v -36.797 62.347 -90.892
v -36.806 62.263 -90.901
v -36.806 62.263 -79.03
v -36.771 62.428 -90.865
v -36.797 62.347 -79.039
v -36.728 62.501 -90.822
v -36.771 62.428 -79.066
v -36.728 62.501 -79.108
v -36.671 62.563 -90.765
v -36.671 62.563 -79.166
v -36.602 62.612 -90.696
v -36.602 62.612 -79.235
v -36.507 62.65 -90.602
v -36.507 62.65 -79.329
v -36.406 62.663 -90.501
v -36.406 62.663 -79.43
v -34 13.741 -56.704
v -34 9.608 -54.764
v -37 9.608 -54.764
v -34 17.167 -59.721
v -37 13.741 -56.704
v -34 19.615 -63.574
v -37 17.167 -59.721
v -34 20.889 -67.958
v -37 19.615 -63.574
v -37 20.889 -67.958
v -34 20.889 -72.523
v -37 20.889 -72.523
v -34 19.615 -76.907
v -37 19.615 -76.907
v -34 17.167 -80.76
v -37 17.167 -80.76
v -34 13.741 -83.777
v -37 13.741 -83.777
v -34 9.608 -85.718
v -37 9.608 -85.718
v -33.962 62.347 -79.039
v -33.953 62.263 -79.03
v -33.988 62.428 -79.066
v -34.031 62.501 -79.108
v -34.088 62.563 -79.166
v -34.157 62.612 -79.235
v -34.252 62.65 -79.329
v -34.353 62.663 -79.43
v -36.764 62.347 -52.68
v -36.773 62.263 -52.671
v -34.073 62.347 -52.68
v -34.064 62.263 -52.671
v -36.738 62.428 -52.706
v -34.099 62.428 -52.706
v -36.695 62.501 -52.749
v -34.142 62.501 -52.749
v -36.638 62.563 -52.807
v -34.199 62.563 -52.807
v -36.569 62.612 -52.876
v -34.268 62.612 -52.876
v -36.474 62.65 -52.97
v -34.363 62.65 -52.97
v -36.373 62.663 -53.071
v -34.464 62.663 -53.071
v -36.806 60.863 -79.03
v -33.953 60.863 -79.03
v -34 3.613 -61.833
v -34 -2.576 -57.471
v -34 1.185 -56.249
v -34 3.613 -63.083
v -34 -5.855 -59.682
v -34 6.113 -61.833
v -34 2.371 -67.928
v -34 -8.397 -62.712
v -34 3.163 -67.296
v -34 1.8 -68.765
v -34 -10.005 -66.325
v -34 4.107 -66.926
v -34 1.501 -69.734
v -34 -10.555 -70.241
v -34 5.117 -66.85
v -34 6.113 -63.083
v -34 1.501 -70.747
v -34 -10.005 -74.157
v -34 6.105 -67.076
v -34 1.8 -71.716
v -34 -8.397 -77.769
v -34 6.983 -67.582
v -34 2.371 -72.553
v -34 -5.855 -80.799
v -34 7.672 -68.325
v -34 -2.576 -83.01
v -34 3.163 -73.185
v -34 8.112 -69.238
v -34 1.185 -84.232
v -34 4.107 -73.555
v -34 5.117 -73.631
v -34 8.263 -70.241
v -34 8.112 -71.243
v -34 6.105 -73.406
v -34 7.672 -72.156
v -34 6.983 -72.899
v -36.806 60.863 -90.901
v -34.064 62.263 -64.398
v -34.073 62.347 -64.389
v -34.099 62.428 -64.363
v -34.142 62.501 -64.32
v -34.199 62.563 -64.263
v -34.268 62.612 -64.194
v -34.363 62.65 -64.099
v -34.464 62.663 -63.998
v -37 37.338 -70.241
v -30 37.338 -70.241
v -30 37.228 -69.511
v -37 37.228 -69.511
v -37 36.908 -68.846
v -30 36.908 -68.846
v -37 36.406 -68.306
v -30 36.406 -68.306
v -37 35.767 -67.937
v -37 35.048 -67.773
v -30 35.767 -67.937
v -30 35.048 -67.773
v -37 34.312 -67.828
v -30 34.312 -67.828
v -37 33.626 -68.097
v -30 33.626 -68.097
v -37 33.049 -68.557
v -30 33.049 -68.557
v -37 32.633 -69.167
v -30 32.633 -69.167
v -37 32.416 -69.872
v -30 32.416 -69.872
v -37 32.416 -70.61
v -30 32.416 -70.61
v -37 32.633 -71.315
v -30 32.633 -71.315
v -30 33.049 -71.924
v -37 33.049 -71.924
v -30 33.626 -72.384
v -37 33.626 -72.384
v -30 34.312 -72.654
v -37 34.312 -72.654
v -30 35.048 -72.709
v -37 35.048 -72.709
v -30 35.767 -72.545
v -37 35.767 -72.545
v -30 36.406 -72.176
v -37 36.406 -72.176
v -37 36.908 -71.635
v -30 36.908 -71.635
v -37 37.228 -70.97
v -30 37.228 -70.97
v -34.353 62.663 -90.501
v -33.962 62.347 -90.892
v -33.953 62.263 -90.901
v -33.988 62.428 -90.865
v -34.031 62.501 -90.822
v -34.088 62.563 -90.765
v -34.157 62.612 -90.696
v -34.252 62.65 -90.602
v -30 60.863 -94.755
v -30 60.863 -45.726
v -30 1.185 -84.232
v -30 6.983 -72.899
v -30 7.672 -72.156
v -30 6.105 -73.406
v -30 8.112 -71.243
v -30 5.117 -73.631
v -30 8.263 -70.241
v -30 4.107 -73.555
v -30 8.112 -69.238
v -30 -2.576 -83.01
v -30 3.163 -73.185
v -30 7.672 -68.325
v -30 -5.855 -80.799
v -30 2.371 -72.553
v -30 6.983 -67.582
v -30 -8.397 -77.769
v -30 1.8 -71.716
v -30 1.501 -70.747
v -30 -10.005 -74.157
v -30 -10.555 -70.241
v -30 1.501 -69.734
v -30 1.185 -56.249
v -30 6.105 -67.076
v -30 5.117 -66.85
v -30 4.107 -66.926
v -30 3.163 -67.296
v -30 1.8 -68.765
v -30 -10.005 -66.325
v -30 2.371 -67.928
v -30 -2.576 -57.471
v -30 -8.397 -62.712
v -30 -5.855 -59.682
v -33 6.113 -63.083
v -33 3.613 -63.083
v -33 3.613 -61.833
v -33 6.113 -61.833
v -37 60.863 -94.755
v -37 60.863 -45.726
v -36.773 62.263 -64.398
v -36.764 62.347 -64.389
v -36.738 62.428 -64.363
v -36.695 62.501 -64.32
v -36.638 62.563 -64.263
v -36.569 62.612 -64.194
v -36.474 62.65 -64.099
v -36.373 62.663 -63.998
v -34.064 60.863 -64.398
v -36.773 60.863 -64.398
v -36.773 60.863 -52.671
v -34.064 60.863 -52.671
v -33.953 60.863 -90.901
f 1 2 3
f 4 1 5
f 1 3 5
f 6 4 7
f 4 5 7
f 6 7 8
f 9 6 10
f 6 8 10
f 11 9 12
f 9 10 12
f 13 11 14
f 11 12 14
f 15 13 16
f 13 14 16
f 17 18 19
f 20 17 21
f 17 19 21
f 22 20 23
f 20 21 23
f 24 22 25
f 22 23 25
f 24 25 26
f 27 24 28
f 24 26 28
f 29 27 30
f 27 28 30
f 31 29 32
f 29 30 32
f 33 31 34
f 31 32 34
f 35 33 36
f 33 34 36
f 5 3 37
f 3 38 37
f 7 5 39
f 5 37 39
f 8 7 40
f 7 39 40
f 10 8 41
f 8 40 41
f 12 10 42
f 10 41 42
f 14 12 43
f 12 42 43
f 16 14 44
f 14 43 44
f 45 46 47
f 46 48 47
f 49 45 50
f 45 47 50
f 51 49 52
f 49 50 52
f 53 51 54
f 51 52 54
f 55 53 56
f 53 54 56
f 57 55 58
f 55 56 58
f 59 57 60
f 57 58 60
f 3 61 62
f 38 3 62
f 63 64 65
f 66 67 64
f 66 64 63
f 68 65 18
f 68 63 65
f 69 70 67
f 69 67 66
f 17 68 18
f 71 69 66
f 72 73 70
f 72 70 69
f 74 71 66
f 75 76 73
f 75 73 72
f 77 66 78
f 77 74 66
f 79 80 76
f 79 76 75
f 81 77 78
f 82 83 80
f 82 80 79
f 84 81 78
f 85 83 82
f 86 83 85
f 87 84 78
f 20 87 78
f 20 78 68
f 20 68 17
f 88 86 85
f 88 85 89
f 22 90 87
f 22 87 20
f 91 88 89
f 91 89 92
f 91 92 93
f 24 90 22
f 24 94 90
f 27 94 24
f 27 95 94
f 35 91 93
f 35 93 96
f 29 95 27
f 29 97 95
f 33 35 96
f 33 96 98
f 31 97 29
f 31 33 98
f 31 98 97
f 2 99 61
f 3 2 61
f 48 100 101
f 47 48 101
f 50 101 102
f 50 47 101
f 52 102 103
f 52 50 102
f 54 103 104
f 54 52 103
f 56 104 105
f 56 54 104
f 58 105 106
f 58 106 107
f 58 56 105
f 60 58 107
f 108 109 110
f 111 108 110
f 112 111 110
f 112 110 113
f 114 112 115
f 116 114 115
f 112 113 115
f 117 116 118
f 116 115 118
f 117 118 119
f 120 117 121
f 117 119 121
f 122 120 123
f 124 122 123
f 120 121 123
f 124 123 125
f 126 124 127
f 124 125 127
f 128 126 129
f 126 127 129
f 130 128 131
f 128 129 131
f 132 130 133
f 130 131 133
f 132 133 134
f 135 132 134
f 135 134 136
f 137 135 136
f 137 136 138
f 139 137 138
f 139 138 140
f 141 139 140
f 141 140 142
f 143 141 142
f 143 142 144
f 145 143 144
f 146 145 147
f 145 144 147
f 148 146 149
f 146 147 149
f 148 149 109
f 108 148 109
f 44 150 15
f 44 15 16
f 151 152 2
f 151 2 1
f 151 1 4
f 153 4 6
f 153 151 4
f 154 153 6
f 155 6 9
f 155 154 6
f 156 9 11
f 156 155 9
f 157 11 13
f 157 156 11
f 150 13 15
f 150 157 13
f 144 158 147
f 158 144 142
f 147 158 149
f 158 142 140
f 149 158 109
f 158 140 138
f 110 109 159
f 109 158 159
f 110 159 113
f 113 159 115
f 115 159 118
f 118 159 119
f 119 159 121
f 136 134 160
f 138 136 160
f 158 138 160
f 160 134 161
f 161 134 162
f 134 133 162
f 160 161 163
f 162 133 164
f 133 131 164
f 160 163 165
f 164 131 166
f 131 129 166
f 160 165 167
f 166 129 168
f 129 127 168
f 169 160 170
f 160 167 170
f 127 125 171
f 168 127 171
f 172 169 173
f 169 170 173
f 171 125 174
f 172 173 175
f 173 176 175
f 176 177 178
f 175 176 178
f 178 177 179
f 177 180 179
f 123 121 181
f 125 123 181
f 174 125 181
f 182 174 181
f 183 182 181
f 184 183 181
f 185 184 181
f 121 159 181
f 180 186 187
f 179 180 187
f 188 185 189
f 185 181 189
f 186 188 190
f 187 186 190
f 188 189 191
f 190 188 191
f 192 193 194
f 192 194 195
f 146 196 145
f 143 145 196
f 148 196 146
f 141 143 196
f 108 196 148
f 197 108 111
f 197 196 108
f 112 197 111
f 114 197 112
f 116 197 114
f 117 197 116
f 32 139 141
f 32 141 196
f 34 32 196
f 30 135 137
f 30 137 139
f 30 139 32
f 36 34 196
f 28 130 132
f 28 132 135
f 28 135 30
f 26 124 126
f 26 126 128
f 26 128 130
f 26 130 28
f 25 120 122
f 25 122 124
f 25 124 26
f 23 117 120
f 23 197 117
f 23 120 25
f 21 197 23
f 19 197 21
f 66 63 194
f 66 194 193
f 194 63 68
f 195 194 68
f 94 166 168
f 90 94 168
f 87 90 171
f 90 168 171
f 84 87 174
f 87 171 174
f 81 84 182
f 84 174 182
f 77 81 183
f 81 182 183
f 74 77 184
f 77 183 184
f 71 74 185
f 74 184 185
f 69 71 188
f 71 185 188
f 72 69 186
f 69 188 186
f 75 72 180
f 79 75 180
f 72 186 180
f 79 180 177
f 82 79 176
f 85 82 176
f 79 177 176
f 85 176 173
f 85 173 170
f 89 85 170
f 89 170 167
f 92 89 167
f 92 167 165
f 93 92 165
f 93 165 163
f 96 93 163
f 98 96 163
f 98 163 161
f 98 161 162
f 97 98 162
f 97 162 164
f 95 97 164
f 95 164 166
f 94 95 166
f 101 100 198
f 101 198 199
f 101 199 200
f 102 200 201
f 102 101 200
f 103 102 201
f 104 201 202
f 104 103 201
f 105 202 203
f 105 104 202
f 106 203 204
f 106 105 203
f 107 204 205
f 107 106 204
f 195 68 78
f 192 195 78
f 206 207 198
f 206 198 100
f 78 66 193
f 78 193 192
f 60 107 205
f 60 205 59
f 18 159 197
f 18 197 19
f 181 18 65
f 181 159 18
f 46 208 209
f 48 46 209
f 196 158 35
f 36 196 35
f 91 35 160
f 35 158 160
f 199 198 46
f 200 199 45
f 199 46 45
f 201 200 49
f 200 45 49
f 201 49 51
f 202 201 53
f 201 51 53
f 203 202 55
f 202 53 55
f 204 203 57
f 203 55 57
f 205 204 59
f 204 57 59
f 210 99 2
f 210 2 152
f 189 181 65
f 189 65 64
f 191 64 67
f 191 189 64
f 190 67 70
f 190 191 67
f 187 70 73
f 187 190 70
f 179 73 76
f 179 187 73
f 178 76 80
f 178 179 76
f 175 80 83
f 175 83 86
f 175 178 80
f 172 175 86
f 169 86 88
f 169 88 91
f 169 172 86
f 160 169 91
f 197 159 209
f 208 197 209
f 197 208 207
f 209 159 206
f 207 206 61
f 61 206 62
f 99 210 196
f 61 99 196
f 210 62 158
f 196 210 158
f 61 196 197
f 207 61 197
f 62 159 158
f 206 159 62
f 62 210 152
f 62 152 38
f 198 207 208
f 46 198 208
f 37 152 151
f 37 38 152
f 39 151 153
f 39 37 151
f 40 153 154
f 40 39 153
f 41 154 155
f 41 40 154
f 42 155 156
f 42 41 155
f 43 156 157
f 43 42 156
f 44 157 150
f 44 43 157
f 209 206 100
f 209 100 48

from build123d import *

# Parameters (mm, degrees)
SKETCH035_R     = 2.475
SKETCH035_R_2   = 3.4
PAD019_DEPTH    = 7
SKETCH036_W     = 11.870498
SKETCH036_H     = 2.853485
SKETCH036_W_2   = 11.727337
SKETCH036_H_2   = 2.709564
PAD020_DEPTH    = 1.8
SKETCH037_R     = 16.1879
POCKET019_DEPTH = 3
SKETCH038_W     = 2.5
SKETCH038_H     = 1.25
POCKET020_DEPTH = 1
FILLET003_R     = 0.4


with BuildPart() as part:
    # Sketch035 (on DatumPlane) → Pad019 (new body)
    with BuildSketch(Plane.YZ.offset(-30)):
        with BuildLine():
            Line((60.863192, -45.726101), (60.863192, -94.755177))
            Line((60.863192, -94.755177), (1.18502, -84.232305))
            ThreePointArc((1.18502, -56.248973), (-10.555381, -70.240639), (1.18502, -84.232305))
            Line((60.863192, -45.726101), (1.18502, -56.248973))
        make_face()
        with Locations((34.863192, -70.240639)):
            Circle(SKETCH035_R, mode=Mode.SUBTRACT)
        with Locations((4.863192, -70.240639)):
            Circle(SKETCH035_R_2, mode=Mode.SUBTRACT)
    extrude(amount=-PAD019_DEPTH)

    # Sketch036 (on Face1 of Pad019) → Pad020 (join)
    with BuildSketch(Plane.ZX.offset(60.863192)):
        with Locations((-84.965439, -35.379314)):
            Rectangle(SKETCH036_W, SKETCH036_H)
        with Locations((-58.534715, -35.418369)):
            Rectangle(SKETCH036_W_2, SKETCH036_H_2)
    extrude(amount=PAD020_DEPTH)

    # Sketch037 (on Face4 of Pad020) → Pocket019 (cut)
    with BuildSketch(Plane(origin=(-37, 0, 0), x_dir=(0, 1, 0), z_dir=(-1, 0, 0))):
        with Locations((4.863192, 70.240639)):
            Circle(SKETCH037_R)
    extrude(amount=-POCKET019_DEPTH, mode=Mode.SUBTRACT)

    # Sketch038 (on Face15 of Pocket019) → Pocket020 (cut)
    with BuildSketch(Plane(origin=(-34, 0, 0), x_dir=(0, 1, 0), z_dir=(-1, 0, 0))):
        with Locations((4.863192, 62.458053)):
            Rectangle(SKETCH038_W, SKETCH038_H)
    extrude(amount=-POCKET020_DEPTH, mode=Mode.SUBTRACT)

    # Fillet003
    fillet003_edges = [part.edges().sort_by_distance(p)[0] for p in [
        (-34.063587, 62.663192, -58.534716),
        (-35.418369, 62.663192, -52.671047),
        (-36.773151, 62.663192, -58.534716),
        (-35.418369, 62.663192, -64.398384),
        (-33.952572, 62.663192, -84.965439),
        (-35.379314, 62.663192, -79.03019),
        (-36.806057, 62.663192, -84.965439),
        (-35.379314, 62.663192, -90.900688),
    ]]
    fillet(fillet003_edges, radius=FILLET003_R)


solid = part.part
